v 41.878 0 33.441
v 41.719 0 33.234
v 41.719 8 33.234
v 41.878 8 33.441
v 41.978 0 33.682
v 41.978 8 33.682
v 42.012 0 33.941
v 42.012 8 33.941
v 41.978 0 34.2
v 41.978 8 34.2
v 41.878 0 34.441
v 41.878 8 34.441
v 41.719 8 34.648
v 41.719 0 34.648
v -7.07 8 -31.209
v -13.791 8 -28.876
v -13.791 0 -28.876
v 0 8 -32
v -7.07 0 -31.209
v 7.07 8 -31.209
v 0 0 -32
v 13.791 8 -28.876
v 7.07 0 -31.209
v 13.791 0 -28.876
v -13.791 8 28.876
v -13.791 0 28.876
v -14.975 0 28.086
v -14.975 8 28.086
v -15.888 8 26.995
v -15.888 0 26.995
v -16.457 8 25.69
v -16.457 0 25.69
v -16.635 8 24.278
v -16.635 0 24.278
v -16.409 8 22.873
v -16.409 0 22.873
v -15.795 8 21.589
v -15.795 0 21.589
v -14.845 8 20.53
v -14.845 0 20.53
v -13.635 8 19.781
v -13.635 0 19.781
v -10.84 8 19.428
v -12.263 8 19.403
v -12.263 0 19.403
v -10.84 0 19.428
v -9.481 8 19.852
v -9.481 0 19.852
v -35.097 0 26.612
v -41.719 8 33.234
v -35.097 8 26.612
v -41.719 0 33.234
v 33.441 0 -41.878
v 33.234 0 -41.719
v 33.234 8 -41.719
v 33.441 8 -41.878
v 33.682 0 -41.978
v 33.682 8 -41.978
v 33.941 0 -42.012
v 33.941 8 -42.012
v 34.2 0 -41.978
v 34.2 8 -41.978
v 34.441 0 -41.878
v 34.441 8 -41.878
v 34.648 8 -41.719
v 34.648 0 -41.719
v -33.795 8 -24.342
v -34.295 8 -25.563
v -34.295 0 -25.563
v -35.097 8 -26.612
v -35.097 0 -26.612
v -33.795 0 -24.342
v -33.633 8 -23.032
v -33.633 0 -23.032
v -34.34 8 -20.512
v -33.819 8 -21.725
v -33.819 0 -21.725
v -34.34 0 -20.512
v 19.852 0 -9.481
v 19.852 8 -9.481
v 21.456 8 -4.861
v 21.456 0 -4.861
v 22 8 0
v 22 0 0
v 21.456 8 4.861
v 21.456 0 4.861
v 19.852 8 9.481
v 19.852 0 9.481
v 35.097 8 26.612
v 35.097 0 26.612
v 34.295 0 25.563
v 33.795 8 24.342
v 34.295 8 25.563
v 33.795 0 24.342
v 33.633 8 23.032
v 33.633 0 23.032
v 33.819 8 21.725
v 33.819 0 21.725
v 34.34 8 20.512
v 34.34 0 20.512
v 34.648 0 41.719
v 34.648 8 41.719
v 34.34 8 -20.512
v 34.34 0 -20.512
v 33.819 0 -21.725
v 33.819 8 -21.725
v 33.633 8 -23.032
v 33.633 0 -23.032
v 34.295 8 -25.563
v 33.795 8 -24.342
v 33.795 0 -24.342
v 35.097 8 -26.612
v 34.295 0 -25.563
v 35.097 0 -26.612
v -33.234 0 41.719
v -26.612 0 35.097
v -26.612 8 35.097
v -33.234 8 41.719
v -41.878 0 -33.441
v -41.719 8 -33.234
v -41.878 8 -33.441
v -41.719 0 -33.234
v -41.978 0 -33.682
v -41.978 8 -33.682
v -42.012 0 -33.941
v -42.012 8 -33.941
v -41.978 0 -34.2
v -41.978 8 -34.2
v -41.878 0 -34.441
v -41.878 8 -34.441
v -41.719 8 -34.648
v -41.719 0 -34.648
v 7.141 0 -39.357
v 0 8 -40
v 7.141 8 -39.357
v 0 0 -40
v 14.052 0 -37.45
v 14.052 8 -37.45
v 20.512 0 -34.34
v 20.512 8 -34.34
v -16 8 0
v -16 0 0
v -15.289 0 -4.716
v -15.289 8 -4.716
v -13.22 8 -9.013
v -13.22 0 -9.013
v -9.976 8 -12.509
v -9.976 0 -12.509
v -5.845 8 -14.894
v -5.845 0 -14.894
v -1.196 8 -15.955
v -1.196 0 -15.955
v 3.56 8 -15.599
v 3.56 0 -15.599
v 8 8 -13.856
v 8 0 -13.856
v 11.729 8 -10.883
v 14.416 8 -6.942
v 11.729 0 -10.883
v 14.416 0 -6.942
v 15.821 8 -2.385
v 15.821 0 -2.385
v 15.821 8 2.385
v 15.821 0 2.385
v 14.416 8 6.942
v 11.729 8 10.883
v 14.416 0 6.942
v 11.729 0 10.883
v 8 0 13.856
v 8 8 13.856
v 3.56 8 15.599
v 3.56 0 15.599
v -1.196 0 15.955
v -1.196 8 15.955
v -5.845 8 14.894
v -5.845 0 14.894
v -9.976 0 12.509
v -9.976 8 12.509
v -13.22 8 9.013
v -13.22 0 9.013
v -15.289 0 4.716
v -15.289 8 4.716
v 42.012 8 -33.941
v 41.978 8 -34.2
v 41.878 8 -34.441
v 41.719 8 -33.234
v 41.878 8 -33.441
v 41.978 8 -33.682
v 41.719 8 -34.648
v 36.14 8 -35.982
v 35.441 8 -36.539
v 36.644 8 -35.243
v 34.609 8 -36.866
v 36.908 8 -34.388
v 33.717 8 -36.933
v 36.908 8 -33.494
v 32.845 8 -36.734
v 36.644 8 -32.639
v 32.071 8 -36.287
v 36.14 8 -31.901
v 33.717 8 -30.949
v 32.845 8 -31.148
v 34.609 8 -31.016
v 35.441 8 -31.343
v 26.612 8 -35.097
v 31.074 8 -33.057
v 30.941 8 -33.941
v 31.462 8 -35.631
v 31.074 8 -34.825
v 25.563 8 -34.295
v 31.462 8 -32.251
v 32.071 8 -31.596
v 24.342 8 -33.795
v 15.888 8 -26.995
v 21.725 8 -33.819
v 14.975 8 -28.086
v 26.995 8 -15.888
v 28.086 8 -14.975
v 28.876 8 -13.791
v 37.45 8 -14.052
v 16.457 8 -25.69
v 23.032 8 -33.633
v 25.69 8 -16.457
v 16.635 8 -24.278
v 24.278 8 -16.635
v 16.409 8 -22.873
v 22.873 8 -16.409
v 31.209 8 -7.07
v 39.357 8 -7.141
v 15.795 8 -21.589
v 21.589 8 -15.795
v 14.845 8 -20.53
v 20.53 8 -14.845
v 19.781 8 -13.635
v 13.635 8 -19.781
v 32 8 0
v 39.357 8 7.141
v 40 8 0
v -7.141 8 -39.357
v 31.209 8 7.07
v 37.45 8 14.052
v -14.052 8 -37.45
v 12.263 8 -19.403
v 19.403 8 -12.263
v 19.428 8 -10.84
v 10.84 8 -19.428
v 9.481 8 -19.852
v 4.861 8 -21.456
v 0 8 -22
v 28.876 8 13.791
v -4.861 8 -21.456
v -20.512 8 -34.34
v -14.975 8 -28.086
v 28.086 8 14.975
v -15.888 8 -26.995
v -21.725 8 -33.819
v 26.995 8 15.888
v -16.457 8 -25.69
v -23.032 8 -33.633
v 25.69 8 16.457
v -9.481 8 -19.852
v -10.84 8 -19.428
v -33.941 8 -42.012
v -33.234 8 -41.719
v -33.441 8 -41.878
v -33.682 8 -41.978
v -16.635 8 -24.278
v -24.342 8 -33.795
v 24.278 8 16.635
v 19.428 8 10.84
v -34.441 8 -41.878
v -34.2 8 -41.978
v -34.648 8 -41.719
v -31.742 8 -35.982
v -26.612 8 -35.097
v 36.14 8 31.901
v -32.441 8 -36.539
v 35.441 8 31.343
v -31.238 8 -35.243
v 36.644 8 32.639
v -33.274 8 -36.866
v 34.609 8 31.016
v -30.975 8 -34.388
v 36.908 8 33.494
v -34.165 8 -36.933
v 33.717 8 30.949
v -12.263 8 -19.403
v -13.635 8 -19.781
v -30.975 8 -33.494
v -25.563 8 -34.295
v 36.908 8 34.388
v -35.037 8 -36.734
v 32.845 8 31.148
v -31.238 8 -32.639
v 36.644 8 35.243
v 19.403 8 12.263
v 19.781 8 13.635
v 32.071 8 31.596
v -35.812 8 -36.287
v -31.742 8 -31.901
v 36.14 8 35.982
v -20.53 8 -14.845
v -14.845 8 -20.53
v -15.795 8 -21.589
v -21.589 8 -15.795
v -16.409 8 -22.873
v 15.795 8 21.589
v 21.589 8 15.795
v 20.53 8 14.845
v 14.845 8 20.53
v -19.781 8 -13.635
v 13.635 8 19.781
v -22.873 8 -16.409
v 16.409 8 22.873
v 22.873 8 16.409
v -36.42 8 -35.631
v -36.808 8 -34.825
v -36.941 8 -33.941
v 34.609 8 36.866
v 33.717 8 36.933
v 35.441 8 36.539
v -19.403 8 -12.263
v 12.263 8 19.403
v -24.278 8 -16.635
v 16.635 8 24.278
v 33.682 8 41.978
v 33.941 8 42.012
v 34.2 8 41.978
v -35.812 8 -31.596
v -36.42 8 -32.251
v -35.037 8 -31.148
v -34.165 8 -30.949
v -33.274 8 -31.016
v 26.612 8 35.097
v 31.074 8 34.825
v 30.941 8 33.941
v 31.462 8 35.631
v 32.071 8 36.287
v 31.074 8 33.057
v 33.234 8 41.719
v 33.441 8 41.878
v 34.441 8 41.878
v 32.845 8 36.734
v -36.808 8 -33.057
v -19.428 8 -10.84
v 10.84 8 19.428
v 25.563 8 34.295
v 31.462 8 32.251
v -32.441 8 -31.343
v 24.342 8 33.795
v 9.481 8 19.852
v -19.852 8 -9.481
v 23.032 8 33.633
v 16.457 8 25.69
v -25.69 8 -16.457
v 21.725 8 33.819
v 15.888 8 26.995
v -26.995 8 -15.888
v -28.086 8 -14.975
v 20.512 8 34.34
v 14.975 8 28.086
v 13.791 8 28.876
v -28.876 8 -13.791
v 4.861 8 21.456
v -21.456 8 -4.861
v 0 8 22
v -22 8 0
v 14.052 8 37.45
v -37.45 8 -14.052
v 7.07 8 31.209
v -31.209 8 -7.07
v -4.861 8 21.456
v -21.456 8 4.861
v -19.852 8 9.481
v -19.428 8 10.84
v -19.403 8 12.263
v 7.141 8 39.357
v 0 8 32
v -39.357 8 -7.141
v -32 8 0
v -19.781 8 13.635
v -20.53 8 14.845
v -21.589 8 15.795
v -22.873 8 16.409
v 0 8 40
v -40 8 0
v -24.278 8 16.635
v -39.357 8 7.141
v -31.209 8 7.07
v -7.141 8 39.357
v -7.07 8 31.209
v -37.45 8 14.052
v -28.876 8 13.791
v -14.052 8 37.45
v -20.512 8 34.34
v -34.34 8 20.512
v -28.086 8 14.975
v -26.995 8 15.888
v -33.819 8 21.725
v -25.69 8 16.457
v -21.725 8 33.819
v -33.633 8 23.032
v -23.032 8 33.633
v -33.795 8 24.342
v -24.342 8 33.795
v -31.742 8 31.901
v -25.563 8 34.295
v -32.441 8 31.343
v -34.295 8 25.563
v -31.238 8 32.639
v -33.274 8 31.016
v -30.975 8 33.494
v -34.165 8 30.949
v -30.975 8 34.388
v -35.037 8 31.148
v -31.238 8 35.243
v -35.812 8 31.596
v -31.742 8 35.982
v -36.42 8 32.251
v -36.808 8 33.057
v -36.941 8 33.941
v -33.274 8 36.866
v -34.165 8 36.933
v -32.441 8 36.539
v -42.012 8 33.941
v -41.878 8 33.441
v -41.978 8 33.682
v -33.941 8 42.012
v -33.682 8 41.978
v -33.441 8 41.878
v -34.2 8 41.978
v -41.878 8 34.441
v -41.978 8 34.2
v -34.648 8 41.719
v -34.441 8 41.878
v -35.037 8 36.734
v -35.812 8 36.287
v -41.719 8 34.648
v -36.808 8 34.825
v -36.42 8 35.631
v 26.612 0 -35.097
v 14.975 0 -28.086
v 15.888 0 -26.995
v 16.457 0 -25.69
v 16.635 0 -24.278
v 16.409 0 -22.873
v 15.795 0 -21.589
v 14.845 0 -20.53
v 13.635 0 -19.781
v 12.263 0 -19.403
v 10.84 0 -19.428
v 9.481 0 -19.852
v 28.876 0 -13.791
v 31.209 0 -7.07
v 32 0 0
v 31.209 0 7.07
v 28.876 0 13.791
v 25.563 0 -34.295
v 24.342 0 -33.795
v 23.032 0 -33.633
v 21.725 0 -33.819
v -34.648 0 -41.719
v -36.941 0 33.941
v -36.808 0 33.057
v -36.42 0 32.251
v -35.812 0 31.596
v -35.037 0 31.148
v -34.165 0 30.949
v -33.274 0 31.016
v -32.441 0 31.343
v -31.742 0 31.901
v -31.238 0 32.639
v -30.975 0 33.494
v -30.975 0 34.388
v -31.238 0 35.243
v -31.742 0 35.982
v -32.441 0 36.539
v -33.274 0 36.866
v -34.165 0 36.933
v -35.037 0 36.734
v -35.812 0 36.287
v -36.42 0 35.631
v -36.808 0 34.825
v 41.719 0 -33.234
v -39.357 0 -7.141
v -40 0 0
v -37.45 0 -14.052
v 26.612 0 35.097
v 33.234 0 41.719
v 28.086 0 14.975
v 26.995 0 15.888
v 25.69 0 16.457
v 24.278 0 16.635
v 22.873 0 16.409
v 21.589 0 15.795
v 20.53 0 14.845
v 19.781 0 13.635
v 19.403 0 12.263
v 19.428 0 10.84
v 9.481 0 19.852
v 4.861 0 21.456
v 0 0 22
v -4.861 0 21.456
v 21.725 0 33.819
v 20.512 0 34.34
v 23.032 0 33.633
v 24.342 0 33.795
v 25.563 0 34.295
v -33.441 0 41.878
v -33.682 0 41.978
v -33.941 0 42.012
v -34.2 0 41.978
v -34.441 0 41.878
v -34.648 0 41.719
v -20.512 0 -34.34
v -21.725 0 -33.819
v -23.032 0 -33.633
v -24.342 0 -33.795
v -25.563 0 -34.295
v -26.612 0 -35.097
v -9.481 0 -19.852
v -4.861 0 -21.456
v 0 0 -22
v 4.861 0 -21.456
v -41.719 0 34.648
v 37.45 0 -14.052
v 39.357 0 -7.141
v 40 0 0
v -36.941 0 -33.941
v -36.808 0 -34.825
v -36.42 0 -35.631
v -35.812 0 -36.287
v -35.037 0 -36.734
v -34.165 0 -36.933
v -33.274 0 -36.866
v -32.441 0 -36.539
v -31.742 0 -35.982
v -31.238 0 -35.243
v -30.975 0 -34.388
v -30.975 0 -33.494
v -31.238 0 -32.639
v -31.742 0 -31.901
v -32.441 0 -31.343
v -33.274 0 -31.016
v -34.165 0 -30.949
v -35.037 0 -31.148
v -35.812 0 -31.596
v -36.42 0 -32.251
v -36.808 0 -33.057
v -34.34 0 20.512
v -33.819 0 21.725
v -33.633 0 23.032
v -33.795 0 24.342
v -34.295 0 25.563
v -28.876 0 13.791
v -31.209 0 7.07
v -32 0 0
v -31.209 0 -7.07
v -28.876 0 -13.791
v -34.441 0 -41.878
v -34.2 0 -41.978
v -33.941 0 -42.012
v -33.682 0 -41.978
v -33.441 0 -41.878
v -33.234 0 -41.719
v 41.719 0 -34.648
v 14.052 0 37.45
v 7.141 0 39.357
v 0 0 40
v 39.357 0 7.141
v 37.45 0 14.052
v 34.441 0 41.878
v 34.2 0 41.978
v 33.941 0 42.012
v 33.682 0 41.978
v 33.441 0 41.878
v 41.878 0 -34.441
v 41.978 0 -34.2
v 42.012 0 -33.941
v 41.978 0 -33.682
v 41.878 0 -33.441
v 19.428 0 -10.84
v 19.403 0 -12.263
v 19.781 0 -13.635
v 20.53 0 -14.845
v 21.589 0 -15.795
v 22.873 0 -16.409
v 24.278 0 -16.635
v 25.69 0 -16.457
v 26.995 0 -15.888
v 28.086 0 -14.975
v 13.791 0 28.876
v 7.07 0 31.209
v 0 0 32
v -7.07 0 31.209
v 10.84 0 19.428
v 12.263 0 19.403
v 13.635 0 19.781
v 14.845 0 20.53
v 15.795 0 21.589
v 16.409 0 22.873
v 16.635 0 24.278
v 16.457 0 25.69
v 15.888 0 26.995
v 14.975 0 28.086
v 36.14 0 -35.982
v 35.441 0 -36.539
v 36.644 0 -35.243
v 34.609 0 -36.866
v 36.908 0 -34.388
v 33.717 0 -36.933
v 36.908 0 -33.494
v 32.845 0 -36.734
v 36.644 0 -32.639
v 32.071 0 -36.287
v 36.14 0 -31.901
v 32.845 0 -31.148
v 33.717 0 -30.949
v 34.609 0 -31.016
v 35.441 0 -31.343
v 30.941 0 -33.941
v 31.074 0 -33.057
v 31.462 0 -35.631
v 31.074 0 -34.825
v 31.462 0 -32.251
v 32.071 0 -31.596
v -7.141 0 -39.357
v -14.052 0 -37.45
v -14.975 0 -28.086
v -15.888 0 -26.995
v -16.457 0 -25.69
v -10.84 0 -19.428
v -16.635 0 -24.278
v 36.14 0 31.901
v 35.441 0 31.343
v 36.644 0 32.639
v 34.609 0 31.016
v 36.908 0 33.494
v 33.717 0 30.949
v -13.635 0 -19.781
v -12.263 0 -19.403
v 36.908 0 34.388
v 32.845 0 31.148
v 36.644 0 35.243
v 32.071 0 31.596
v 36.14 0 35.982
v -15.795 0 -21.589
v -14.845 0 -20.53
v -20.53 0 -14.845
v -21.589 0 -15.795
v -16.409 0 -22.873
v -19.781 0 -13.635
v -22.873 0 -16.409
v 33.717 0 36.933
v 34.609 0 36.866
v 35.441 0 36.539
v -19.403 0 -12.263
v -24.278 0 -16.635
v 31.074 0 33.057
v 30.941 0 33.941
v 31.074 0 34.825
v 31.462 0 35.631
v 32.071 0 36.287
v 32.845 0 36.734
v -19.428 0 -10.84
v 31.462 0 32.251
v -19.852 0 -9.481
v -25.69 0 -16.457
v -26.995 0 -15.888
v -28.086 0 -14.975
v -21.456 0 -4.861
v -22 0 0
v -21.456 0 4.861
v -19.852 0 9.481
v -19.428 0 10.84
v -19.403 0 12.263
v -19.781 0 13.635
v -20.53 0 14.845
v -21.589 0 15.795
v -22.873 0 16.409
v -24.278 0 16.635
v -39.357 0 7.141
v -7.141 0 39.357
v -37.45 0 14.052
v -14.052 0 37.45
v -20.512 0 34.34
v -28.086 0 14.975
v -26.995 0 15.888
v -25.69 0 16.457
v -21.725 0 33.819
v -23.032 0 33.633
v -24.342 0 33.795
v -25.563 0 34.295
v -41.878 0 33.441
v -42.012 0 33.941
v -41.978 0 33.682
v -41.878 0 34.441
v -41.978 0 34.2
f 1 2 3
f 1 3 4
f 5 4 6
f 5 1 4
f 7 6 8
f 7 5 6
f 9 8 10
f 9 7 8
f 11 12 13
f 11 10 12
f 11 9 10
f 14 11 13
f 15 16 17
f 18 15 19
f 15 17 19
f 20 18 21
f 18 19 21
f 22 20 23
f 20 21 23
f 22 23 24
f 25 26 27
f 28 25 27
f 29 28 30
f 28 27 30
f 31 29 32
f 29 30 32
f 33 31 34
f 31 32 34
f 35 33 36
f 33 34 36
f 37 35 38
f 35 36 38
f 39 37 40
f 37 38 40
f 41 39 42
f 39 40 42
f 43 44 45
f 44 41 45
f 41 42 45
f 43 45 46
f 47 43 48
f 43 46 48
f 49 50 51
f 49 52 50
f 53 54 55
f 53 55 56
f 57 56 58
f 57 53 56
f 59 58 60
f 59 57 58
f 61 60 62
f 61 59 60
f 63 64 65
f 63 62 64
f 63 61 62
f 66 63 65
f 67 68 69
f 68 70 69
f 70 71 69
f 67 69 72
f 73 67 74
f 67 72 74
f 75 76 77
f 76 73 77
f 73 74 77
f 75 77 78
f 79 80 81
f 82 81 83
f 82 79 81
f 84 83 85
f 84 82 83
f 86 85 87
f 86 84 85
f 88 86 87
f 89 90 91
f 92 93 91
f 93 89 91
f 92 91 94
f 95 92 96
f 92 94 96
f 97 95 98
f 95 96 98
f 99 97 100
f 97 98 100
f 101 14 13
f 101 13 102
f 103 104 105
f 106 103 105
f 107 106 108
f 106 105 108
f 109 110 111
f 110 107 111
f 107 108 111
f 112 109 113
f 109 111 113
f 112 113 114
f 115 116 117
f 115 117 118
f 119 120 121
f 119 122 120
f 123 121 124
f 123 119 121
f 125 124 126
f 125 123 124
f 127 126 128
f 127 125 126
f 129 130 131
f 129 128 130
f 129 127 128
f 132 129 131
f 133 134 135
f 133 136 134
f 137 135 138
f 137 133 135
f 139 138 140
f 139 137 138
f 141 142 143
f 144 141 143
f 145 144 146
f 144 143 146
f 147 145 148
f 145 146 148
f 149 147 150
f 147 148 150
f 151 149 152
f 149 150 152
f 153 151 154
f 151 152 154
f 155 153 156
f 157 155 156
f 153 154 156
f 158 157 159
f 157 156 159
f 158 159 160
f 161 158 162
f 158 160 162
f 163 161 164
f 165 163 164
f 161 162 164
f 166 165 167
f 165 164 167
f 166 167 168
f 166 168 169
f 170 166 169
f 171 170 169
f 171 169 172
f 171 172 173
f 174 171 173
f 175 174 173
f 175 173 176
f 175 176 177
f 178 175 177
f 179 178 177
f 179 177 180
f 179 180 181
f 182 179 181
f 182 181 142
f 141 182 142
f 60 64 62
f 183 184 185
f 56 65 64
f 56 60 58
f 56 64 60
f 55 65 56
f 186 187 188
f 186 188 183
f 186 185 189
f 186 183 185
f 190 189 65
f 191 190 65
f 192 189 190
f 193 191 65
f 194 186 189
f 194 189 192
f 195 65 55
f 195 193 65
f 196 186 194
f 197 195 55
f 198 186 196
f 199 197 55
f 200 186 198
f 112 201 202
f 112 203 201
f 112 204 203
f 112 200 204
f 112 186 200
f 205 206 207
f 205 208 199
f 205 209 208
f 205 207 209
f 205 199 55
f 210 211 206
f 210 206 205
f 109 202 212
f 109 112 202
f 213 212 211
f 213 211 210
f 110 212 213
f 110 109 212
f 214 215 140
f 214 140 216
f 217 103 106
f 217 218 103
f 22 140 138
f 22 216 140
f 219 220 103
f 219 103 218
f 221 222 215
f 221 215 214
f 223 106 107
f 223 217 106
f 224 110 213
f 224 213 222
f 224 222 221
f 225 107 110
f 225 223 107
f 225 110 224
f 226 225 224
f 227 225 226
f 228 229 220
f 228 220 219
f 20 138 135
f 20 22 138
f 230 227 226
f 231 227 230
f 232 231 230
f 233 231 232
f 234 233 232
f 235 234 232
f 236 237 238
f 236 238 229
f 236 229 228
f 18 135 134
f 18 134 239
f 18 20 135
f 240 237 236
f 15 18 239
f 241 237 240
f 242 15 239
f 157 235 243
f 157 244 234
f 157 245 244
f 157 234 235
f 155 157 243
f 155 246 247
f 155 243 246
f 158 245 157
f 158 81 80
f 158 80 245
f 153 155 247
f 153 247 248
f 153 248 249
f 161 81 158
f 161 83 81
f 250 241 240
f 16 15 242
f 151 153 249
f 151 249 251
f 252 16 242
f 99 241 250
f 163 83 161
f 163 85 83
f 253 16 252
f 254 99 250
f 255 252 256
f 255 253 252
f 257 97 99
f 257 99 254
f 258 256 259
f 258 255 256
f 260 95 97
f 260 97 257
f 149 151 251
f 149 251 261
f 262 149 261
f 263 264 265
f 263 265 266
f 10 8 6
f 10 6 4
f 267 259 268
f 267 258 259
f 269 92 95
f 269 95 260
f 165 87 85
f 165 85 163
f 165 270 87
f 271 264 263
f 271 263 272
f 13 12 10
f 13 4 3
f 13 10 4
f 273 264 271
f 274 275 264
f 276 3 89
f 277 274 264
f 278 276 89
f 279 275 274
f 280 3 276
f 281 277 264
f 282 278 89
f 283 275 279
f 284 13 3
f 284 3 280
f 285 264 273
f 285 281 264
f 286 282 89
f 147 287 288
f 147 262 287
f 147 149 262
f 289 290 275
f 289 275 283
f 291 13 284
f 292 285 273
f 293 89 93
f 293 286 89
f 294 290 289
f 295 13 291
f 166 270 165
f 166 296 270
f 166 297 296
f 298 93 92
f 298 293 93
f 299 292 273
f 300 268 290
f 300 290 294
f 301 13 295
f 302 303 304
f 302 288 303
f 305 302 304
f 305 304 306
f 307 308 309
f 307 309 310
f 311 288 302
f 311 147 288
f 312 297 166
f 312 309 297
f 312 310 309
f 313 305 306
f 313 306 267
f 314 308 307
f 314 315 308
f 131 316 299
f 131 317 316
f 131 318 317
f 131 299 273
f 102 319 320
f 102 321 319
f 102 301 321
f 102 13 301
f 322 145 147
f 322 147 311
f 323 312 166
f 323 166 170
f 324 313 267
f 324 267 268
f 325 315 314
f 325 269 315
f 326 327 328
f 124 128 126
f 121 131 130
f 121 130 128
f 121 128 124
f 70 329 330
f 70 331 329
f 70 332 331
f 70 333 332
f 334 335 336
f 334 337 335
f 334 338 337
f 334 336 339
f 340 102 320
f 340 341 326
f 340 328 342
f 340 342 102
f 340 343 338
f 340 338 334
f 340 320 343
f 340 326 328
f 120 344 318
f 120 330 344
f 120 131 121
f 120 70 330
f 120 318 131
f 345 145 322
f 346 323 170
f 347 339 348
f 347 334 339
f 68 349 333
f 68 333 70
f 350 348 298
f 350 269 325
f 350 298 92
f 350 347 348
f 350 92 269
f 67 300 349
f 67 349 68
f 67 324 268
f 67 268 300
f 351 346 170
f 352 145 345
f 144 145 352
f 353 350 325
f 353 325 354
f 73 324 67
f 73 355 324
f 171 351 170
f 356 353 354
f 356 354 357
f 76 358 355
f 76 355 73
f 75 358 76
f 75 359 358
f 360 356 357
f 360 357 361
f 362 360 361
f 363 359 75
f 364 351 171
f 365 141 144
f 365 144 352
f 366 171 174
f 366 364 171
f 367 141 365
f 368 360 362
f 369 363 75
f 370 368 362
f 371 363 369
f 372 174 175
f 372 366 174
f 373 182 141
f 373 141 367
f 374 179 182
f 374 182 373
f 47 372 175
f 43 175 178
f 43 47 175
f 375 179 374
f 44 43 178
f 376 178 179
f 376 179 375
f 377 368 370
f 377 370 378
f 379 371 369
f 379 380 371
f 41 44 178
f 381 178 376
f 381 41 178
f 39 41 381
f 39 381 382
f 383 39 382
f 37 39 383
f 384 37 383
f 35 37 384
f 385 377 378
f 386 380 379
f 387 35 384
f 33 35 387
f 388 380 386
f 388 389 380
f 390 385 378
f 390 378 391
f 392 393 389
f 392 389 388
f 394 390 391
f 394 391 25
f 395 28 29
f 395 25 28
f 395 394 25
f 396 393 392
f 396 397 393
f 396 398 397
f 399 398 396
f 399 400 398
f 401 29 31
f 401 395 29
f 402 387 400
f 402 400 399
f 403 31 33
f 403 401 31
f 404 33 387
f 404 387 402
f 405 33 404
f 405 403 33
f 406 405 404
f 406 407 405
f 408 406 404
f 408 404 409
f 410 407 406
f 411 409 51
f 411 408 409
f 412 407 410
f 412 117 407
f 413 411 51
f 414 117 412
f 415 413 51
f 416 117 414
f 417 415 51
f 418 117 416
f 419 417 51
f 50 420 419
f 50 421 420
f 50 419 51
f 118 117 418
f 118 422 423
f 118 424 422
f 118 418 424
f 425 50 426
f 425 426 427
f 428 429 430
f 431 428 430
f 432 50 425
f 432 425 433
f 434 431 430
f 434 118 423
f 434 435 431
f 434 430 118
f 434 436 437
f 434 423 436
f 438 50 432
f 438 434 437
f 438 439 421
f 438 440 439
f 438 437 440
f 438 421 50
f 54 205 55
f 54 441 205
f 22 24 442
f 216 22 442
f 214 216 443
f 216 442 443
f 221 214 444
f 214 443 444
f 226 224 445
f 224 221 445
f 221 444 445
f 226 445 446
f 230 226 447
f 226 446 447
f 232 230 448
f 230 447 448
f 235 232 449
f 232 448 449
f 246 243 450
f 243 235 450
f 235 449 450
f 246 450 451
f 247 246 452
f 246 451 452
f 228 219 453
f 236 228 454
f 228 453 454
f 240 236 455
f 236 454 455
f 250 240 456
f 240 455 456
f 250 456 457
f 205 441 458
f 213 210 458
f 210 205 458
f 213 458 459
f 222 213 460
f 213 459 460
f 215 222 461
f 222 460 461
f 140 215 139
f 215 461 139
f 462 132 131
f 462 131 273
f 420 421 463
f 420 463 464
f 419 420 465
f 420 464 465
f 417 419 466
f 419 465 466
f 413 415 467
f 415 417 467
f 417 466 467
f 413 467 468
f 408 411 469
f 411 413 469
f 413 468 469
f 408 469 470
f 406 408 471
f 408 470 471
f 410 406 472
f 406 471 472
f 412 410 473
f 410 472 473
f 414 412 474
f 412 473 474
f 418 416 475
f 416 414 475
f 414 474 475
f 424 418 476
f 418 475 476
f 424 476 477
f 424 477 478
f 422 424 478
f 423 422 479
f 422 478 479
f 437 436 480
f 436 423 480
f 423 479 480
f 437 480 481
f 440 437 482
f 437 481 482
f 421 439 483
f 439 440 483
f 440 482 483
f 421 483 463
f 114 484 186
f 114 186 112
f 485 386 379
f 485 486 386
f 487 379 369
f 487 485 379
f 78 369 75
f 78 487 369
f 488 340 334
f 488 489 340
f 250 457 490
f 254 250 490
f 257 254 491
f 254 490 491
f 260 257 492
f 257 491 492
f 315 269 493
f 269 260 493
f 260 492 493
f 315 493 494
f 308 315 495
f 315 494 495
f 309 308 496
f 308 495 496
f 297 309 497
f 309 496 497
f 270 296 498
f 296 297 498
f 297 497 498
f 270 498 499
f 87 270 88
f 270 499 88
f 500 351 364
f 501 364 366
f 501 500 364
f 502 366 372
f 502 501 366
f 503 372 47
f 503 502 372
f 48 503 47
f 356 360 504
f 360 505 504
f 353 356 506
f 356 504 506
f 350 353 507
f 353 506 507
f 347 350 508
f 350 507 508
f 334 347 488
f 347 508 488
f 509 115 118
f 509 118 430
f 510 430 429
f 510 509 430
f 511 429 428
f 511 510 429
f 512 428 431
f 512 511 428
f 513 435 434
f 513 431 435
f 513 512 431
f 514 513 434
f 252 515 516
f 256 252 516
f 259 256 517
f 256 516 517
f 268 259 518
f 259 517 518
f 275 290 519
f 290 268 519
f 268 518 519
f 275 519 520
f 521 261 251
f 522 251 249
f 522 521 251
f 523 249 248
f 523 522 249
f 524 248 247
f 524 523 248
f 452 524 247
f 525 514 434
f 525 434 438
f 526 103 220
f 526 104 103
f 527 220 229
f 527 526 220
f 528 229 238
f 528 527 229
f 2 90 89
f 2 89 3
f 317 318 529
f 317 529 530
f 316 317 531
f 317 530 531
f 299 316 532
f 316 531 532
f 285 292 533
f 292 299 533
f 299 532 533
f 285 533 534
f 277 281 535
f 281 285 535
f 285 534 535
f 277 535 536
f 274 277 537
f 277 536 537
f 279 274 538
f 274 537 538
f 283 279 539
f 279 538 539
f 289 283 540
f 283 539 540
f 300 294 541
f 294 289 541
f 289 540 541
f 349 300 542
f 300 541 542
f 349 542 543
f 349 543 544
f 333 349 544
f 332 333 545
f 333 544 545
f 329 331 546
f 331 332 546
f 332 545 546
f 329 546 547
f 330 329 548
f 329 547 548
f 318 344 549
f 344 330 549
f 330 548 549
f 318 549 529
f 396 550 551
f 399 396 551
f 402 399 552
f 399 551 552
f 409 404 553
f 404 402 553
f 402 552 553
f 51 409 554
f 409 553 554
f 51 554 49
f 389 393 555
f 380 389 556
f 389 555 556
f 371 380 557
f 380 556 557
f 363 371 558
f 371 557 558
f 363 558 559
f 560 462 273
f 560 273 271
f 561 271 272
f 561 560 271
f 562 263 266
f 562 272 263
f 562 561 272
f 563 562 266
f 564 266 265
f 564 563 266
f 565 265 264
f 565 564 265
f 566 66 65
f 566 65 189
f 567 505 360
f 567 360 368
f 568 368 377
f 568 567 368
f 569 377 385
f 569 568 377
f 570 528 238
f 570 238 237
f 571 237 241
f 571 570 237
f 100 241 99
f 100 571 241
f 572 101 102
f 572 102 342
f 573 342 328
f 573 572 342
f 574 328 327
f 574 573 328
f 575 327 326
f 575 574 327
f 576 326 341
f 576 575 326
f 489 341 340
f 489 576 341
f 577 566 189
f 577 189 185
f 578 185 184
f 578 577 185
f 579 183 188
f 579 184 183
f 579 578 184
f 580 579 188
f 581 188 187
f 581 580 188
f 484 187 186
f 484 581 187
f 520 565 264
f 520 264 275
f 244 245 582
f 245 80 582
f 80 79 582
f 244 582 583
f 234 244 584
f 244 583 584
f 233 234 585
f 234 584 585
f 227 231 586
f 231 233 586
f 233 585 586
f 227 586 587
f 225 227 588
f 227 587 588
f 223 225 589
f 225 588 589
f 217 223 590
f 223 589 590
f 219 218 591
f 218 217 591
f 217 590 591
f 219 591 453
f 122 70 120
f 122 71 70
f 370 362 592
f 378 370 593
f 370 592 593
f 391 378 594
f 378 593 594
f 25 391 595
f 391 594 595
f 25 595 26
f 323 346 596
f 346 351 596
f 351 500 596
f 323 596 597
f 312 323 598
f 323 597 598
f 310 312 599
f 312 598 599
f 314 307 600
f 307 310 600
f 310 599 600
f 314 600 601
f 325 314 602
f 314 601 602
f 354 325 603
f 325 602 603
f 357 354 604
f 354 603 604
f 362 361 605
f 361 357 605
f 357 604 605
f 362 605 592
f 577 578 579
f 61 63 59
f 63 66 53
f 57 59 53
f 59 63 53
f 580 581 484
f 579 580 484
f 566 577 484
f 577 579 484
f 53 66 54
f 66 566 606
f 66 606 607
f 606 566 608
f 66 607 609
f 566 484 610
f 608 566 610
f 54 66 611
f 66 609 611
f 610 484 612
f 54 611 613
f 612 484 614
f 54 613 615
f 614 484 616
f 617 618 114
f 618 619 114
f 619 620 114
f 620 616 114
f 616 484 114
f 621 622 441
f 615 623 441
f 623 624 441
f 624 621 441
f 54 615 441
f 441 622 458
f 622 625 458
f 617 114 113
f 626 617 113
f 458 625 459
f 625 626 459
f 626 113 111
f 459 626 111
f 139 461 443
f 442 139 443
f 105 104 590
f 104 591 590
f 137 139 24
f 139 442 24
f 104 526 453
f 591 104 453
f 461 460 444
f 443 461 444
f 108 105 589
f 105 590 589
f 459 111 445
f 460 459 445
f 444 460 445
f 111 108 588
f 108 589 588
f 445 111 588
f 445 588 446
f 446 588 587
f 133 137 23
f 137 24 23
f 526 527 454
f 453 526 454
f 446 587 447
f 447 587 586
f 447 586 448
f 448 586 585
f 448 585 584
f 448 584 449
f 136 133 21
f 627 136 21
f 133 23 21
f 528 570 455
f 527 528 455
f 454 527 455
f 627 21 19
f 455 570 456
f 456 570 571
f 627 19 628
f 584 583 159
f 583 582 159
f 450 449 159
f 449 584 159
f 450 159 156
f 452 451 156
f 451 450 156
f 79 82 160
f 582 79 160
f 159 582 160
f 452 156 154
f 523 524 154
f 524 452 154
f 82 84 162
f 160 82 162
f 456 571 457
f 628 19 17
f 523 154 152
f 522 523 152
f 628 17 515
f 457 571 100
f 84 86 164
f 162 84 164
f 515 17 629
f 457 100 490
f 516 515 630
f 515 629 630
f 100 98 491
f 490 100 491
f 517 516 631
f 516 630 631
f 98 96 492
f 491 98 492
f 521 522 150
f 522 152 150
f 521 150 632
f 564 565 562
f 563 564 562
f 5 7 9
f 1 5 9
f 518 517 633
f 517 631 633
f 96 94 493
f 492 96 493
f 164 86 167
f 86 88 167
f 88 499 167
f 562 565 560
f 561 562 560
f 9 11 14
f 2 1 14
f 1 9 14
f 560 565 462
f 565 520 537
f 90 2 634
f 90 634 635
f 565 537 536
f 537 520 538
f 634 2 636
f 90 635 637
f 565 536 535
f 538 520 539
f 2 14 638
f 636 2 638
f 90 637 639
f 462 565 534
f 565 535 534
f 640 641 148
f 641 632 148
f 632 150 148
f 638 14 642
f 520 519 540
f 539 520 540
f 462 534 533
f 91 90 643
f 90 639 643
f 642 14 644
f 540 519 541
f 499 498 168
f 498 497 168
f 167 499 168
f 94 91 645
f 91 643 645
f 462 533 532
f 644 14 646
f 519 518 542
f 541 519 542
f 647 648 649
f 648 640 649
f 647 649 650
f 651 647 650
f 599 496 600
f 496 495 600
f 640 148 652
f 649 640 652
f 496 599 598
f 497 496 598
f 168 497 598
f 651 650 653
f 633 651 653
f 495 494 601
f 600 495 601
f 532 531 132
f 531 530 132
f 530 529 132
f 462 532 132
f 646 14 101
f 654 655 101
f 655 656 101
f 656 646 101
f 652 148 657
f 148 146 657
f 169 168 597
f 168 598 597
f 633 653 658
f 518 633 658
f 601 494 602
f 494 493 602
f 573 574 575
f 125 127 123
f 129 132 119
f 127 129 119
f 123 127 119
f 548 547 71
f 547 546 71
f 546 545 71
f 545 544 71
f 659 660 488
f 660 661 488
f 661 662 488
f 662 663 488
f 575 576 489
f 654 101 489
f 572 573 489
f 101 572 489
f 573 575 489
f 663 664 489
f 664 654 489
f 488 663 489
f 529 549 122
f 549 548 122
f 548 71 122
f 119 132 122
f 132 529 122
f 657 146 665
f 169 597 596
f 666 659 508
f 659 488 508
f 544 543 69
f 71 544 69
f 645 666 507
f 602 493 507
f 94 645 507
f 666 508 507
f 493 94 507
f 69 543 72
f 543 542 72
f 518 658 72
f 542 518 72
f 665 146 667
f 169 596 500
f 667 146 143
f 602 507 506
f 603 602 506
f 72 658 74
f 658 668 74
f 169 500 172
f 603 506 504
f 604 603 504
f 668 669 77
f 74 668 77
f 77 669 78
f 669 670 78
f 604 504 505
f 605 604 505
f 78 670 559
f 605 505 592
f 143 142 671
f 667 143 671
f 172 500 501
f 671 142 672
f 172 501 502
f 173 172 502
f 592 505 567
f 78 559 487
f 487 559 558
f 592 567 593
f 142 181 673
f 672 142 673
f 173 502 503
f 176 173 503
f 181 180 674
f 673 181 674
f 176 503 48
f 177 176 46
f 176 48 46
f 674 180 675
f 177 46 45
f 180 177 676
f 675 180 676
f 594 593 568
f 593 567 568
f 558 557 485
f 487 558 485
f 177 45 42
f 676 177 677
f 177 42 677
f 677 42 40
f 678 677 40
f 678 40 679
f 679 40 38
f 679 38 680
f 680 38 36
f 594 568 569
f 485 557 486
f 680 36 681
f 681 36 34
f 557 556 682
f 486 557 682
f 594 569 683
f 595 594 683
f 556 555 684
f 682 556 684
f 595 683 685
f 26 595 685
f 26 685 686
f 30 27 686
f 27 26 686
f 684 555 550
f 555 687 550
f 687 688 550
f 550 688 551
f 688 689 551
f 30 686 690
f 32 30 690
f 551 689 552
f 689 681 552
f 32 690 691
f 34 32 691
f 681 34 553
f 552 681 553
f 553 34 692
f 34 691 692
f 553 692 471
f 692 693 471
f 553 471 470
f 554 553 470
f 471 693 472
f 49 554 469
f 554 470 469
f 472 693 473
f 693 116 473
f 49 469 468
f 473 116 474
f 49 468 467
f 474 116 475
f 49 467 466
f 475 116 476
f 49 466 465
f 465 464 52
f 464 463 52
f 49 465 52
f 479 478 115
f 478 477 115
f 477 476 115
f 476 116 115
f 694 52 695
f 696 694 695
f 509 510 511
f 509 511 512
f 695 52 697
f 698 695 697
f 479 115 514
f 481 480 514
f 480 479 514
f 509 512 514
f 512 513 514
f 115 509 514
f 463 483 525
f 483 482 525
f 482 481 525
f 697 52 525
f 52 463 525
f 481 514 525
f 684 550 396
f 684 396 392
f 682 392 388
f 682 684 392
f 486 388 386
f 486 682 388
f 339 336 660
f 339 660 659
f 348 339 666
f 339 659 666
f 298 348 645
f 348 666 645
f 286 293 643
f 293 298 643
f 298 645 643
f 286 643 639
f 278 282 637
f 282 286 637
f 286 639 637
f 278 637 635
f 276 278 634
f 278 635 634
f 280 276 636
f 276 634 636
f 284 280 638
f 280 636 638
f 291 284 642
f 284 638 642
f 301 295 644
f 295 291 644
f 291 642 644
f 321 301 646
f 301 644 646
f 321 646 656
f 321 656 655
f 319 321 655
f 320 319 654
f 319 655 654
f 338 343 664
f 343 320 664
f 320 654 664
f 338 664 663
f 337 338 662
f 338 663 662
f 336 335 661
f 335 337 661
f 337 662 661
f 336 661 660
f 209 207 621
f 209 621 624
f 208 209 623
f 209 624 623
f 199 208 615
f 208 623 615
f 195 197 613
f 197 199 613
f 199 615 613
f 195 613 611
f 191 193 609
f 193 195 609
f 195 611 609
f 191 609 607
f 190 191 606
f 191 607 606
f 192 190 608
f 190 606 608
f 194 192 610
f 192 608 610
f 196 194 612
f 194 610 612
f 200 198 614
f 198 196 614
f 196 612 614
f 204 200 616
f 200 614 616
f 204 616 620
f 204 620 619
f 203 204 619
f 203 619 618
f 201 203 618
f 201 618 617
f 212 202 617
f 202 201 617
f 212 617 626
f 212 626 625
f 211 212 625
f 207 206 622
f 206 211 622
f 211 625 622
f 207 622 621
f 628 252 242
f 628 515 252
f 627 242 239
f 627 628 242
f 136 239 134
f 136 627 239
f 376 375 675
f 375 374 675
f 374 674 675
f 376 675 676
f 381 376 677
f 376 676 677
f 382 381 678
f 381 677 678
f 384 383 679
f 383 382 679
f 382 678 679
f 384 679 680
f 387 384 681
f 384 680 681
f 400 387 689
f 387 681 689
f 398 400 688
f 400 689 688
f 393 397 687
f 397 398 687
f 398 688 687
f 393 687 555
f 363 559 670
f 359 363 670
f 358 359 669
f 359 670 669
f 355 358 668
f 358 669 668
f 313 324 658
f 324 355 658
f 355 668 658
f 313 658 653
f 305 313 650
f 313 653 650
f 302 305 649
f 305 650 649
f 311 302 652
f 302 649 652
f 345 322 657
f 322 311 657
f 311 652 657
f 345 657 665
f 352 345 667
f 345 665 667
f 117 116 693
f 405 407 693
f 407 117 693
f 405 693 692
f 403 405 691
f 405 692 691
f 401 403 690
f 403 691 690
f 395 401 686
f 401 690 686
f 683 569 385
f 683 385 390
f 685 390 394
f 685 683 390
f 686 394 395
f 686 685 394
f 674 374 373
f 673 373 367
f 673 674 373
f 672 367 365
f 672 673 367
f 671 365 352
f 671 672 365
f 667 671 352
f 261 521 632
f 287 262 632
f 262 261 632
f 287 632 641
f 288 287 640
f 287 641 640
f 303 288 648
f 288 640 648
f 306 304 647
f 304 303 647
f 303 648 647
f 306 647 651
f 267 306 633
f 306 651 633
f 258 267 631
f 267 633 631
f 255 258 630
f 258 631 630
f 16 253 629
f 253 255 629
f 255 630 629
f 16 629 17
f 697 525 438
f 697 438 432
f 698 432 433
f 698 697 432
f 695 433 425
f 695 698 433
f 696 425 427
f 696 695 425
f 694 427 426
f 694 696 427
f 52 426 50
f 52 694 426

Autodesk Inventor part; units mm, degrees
ref_plane "YZ Plane" through (0, 0, 0) normal (1, 0, 0) x (0, 1, 0)
ref_plane "XZ Plane" through (0, 0, 0) normal (0, 1, 0) x (-1, 0, 0)
ref_plane "XY Plane" through (0, 0, 0) normal (0, 0, 1) x (1, 0, 0)
sketch "Esquisse1" plane through (0, 0, 0) normal (0, 1, 0) x (-1, 0, 0)
  circle A0 centre (33.9411, 33.9411) radius 3
  line L0 (0, -58.8171) -> (0, 58.8171) projected
  line L1 (-58.8171, 0) -> (58.8171, 0) projected
  line L2 (0, 0) -> (33.9411, 33.9411) construction
  line L3 (26.6119, 35.0971) -> (33.234, 41.7193)
  line L4 (34.6482, 41.7193) -> (41.7193, 34.6482)
  line L5 (41.7193, 33.234) -> (35.0971, 26.6119)
  arc A1 (34.6482, 41.7193) -> (33.234, 41.7193) centre (33.9411, 41.0122) ccw
  arc A2 (41.7193, 33.234) -> (41.7193, 34.6482) centre (41.0122, 33.9411) ccw
  arc A3 (11.636, 24.364) -> (-11.636, 24.364) centre (0, 0) ccw construction
  arc A4 (13.7909, 28.8758) -> (-13.7909, 28.8758) centre (0, 0) ccw
  arc A5 (9.4812, 19.8521) -> (-9.4812, 19.8521) centre (0, 0) ccw
  arc A6 (9.4812, 19.8521) -> (13.7909, 28.8758) centre (11.636, 24.364) ccw
  arc A7 (-13.7909, 28.8758) -> (-9.4812, 19.8521) centre (-11.636, 24.364) ccw
  circle A8 centre (0, 0) radius 16
  arc A9 (20.5123, 34.3402) -> (0, 40) centre (0, 0) ccw
  arc A10 (40, 0) -> (34.3402, 20.5123) centre (0, 0) ccw
  arc A11 (20.5123, 34.3402) -> (26.6119, 35.0971) centre (23.0763, 38.6327) ccw
  arc A12 (35.0971, 26.6119) -> (34.3402, 20.5123) centre (38.6327, 23.0763) ccw
  circle A13 centre (-33.9411, 33.9411) radius 3
  line L6 (0, 0) -> (-33.9411, 33.9411) construction
  line L7 (-35.0971, 26.6119) -> (-41.7193, 33.234)
  line L8 (-41.7193, 34.6482) -> (-34.6482, 41.7193)
  line L9 (-33.234, 41.7193) -> (-26.6119, 35.0971)
  arc A14 (-41.7193, 34.6482) -> (-41.7193, 33.234) centre (-41.0122, 33.9411) ccw
  arc A15 (-33.234, 41.7193) -> (-34.6482, 41.7193) centre (-33.9411, 41.0122) ccw
  arc A16 (-24.364, 11.636) -> (-24.364, -11.636) centre (0, 0) ccw construction
  arc A17 (-28.8758, 13.7909) -> (-28.8758, -13.7909) centre (0, 0) ccw
  arc A18 (-19.8521, 9.4812) -> (-19.8521, -9.4812) centre (0, 0) ccw
  arc A19 (-19.8521, 9.4812) -> (-28.8758, 13.7909) centre (-24.364, 11.636) ccw
  arc A20 (-28.8758, -13.7909) -> (-19.8521, -9.4812) centre (-24.364, -11.636) ccw
  arc A21 (-34.3402, 20.5123) -> (-40, 0) centre (0, 0) ccw
  arc A22 (0, 40) -> (-20.5123, 34.3402) centre (0, 0) ccw
  arc A23 (-34.3402, 20.5123) -> (-35.0971, 26.6119) centre (-38.6327, 23.0763) ccw
  arc A24 (-26.6119, 35.0971) -> (-20.5123, 34.3402) centre (-23.0763, 38.6327) ccw
  circle A25 centre (-33.9411, -33.9411) radius 3
  line L10 (0, 0) -> (-33.9411, -33.9411) construction
  line L11 (-26.6119, -35.0971) -> (-33.234, -41.7193)
  line L12 (-34.6482, -41.7193) -> (-41.7193, -34.6482)
  line L13 (-41.7193, -33.234) -> (-35.0971, -26.6119)
  arc A26 (-34.6482, -41.7193) -> (-33.234, -41.7193) centre (-33.9411, -41.0122) ccw
  arc A27 (-41.7193, -33.234) -> (-41.7193, -34.6482) centre (-41.0122, -33.9411) ccw
  arc A28 (-11.636, -24.364) -> (11.636, -24.364) centre (0, 0) ccw construction
  arc A29 (-13.7909, -28.8758) -> (13.7909, -28.8758) centre (0, 0) ccw
  arc A30 (-9.4812, -19.8521) -> (9.4812, -19.8521) centre (0, 0) ccw
  arc A31 (-9.4812, -19.8521) -> (-13.7909, -28.8758) centre (-11.636, -24.364) ccw
  arc A32 (13.7909, -28.8758) -> (9.4812, -19.8521) centre (11.636, -24.364) ccw
  arc A33 (-20.5123, -34.3402) -> (0, -40) centre (0, 0) ccw
  arc A34 (-40, 0) -> (-34.3402, -20.5123) centre (0, 0) ccw
  arc A35 (-20.5123, -34.3402) -> (-26.6119, -35.0971) centre (-23.0763, -38.6327) ccw
  arc A36 (-35.0971, -26.6119) -> (-34.3402, -20.5123) centre (-38.6327, -23.0763) ccw
  circle A37 centre (33.9411, -33.9411) radius 3
  line L14 (0, 0) -> (33.9411, -33.9411) construction
  line L15 (35.0971, -26.6119) -> (41.7193, -33.234)
  line L16 (41.7193, -34.6482) -> (34.6482, -41.7193)
  line L17 (33.234, -41.7193) -> (26.6119, -35.0971)
  arc A38 (41.7193, -34.6482) -> (41.7193, -33.234) centre (41.0122, -33.9411) ccw
  arc A39 (33.234, -41.7193) -> (34.6482, -41.7193) centre (33.9411, -41.0122) ccw
  arc A40 (24.364, -11.636) -> (24.364, 11.636) centre (0, 0) ccw construction
  arc A41 (28.8758, -13.7909) -> (28.8758, 13.7909) centre (0, 0) ccw
  arc A42 (19.8521, -9.4812) -> (19.8521, 9.4812) centre (0, 0) ccw
  arc A43 (19.8521, -9.4812) -> (28.8758, -13.7909) centre (24.364, -11.636) ccw
  arc A44 (28.8758, 13.7909) -> (19.8521, 9.4812) centre (24.364, 11.636) ccw
  arc A45 (34.3402, -20.5123) -> (40, 0) centre (0, 0) ccw
  arc A46 (0, -40) -> (20.5123, -34.3402) centre (0, 0) ccw
  arc A47 (34.3402, -20.5123) -> (35.0971, -26.6119) centre (38.6327, -23.0763) ccw
  arc A48 (26.6119, -35.0971) -> (20.5123, -34.3402) centre (23.0763, -38.6327) ccw
  circle A49 centre (0, 0) radius 16 construction
  point P0 (23.7216, 32.2069)
  point P1 (32.2069, 23.7216)
  point P2 (-32.2069, 23.7216)
  point P3 (-23.7216, 32.2069)
  point P4 (-23.7216, -32.2069)
  point P5 (-32.2069, -23.7216)
  point P6 (32.2069, -23.7216)
  point P7 (23.7216, -32.2069)
  dimension "d1" = 6
  dimension "d2" = 48
  dimension "d3" = 6
  dimension "d4" = 6
  dimension "d5" = 45
  dimension "d6" = 1
  dimension "d9" = 10
  dimension "d10" = 9
  dimension "d11" = 40
  dimension "d12" = 5
  dimension "d13" = 27
extrude "Extrusion1" add sketch "Esquisse1" along normal blind 8 contours A33 A35 L11 A26 L12 A27 L13 A36 A34 L1 A17 A20 A18 A8 L0 A30 A31 A29 | L0 A29 A32 A30 A8 L1 A42 A43 A41 A45 A47 L15 A38 L16 A39 L17 A48 A46 | L1 A18 A19 A17 A21 A23 L7 A14 L8 A15 L9 A24 A22 L0 A4 A7 A5 A8 | A8 L0 A5 A6 A4 A9 A11 L3 A1 L4 A2 L5 A12 A10 L1 A41 A44 A42
equation "\"d4\" = d3"
properties part number "Colossus_7kW_Stator"
